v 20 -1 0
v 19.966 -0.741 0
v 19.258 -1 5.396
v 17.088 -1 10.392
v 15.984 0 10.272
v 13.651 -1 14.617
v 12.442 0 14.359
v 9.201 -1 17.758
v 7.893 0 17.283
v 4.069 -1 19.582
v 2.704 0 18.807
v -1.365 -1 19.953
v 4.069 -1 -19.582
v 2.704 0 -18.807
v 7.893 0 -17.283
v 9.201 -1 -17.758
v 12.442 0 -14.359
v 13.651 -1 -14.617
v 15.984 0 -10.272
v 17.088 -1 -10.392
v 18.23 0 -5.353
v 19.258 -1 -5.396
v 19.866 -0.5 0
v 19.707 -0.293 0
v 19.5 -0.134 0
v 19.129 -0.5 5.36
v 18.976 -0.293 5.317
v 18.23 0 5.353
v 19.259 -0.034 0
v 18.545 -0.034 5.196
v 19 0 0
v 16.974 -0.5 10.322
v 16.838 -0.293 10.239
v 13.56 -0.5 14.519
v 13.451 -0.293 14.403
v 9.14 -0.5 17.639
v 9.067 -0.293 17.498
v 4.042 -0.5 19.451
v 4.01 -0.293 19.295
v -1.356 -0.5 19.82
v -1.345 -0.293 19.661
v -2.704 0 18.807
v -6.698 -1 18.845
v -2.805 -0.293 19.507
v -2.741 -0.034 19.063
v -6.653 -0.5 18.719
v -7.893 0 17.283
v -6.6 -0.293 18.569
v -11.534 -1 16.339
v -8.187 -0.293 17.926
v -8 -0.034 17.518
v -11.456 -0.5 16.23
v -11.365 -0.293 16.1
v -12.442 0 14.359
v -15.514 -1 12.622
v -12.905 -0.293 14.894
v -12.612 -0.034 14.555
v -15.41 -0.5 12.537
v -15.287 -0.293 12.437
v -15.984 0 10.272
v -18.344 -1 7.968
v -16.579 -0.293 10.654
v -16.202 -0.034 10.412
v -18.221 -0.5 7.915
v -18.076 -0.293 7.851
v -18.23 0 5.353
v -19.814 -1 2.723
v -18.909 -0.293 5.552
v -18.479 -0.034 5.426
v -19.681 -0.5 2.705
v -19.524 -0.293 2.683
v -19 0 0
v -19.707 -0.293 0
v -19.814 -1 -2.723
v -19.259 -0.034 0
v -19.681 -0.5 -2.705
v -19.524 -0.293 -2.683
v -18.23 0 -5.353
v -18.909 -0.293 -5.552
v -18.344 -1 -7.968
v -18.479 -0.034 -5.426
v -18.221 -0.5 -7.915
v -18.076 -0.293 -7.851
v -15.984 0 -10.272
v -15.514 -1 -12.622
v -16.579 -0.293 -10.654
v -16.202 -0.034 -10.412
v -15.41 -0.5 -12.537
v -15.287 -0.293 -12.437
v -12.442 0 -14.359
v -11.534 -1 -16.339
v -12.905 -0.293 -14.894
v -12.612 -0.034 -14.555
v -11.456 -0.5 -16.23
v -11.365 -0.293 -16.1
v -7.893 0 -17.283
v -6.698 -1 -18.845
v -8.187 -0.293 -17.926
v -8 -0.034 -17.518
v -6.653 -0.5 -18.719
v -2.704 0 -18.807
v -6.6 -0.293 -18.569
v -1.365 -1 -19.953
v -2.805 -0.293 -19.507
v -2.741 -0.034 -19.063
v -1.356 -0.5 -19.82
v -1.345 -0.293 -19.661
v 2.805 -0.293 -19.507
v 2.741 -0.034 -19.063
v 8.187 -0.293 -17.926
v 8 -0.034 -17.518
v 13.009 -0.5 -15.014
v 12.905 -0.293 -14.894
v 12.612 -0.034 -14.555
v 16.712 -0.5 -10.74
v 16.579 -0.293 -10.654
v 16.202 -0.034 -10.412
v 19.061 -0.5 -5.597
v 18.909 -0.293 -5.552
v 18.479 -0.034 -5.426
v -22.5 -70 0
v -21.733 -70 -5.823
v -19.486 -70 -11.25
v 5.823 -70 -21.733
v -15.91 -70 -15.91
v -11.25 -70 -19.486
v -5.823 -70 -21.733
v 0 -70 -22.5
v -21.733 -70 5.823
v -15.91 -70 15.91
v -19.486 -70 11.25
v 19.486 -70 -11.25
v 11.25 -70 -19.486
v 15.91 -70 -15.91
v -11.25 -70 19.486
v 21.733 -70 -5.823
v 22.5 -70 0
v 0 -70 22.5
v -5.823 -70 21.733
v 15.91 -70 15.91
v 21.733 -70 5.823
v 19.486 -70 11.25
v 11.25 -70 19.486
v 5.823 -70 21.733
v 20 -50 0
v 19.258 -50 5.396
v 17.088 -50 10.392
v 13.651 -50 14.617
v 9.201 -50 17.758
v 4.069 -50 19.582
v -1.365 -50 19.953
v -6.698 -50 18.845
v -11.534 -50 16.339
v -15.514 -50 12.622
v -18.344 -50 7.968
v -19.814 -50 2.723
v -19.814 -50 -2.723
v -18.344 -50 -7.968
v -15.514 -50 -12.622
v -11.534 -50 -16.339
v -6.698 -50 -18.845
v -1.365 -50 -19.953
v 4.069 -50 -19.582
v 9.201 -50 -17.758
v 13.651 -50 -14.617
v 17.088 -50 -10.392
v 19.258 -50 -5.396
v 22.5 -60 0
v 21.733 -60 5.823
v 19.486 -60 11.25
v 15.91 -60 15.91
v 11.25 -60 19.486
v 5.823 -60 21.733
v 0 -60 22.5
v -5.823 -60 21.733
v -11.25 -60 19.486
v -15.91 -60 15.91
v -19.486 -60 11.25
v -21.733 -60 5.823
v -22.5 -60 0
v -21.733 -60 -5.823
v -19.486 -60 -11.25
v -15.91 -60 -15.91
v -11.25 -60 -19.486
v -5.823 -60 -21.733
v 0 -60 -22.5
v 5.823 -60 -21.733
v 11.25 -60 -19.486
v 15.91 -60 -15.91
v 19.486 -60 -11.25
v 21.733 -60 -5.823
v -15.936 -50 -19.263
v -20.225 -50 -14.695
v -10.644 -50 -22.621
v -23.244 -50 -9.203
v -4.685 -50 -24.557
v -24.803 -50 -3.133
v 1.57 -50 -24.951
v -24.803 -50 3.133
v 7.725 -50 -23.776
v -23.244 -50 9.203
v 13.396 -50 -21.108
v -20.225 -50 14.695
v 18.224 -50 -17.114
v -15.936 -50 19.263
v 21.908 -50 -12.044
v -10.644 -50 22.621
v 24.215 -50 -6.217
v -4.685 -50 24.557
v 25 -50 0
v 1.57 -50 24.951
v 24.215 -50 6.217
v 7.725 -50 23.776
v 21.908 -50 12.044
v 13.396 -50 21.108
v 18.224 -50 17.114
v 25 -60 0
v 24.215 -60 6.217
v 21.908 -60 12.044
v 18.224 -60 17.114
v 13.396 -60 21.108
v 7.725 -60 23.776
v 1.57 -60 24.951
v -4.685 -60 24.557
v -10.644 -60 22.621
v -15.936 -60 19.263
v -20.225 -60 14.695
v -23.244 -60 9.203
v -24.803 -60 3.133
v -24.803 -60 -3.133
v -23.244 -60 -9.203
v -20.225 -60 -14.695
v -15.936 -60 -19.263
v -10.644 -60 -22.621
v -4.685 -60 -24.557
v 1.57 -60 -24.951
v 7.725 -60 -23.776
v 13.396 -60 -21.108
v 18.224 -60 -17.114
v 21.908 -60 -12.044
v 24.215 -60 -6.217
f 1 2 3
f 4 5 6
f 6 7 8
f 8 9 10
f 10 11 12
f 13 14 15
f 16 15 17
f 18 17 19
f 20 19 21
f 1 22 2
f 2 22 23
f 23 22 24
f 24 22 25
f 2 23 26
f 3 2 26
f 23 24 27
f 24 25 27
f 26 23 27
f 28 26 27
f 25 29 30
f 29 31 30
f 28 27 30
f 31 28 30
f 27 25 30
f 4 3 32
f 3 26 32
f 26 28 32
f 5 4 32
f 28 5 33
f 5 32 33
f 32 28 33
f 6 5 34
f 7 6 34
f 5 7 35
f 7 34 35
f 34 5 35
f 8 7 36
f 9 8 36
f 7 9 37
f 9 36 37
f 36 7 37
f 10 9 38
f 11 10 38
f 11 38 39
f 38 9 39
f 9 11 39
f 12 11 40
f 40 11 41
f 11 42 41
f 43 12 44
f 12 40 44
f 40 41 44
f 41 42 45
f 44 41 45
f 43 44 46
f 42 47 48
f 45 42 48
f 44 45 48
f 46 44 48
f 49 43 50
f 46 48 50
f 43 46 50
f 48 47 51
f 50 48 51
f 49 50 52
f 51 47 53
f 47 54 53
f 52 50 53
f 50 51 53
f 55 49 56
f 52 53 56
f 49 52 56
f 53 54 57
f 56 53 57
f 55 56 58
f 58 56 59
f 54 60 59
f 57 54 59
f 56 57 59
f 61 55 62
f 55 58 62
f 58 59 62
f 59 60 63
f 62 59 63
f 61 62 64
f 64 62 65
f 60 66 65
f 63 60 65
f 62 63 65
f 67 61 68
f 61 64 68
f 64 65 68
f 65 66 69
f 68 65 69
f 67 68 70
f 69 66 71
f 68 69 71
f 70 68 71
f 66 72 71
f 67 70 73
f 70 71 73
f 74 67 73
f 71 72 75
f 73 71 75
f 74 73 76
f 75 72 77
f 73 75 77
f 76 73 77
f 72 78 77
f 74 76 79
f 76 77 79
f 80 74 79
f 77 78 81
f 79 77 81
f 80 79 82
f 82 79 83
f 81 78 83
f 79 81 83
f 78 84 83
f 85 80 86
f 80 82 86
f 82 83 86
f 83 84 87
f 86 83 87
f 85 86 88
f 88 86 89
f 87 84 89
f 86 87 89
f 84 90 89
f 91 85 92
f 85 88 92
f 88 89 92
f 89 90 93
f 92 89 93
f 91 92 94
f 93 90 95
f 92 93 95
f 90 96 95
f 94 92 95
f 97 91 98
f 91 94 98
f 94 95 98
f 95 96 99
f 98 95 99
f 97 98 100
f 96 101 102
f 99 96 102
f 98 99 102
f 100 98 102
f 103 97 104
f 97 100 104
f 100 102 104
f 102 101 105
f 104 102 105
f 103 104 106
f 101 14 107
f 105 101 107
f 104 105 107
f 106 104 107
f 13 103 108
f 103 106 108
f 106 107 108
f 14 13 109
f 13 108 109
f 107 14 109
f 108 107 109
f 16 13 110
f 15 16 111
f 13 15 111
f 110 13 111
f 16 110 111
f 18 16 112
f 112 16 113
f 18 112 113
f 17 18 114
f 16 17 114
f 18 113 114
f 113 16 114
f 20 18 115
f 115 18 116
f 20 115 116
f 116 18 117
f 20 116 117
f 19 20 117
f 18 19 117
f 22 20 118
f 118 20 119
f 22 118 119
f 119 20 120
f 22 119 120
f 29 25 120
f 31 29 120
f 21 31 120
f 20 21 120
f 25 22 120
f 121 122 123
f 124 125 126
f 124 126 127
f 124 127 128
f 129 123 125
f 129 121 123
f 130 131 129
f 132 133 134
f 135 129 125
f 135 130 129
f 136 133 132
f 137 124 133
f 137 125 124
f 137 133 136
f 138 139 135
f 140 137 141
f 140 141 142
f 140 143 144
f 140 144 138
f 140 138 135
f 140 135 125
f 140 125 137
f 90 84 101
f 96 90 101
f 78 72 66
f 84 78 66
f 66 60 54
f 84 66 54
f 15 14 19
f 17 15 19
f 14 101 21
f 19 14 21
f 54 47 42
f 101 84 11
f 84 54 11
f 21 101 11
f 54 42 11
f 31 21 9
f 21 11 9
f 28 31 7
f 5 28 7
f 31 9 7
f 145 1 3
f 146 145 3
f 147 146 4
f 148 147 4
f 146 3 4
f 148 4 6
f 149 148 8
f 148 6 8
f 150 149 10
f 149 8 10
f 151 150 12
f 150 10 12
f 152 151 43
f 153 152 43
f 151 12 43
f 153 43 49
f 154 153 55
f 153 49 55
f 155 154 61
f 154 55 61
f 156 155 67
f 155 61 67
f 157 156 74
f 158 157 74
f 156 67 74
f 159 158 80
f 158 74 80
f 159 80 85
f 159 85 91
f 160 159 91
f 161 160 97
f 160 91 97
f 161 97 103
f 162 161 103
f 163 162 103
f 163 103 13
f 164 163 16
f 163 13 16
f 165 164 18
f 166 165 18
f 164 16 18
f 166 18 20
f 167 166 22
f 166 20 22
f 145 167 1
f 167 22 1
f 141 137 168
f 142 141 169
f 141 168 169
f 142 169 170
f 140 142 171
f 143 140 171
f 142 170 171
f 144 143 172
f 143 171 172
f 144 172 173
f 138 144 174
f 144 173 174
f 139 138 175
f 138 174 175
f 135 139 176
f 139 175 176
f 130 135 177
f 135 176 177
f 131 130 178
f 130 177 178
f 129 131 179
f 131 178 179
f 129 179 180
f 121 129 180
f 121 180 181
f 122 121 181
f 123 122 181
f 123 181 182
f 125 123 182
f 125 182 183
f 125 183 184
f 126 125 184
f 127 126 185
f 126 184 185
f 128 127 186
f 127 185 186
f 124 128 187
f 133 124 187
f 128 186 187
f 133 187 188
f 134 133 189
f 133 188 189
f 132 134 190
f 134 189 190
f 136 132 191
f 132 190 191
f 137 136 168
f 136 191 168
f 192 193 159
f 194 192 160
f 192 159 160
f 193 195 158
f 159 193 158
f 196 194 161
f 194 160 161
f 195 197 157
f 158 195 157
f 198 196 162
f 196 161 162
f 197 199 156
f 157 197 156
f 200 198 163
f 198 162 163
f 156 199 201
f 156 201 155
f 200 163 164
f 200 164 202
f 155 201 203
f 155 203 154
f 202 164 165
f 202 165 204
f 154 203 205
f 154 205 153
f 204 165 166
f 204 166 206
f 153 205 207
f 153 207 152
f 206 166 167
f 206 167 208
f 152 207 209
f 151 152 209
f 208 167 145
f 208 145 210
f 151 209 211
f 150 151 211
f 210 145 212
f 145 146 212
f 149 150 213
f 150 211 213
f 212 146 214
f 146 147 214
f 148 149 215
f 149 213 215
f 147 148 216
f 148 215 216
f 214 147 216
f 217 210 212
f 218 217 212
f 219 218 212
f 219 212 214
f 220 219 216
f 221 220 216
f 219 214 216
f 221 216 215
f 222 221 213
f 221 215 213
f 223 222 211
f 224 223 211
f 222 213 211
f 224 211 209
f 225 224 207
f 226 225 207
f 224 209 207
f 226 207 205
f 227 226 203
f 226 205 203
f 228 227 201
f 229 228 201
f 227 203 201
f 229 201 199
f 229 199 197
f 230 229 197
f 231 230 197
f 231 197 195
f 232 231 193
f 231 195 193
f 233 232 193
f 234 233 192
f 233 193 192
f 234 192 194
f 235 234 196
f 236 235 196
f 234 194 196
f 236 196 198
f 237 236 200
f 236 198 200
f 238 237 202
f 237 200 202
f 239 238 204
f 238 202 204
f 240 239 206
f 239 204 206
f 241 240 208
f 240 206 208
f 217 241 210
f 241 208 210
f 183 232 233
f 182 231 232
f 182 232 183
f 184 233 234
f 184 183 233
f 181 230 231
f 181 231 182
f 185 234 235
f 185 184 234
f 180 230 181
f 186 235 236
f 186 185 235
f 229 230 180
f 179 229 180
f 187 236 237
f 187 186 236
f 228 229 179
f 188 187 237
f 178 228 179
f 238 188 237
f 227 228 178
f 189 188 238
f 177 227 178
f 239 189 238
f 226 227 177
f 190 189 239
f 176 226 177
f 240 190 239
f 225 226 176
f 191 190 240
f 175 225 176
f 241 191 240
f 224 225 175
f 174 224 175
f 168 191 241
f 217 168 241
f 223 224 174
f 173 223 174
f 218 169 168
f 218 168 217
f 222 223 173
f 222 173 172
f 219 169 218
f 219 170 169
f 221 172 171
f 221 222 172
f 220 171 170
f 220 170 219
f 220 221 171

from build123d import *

# Parameters (mm, degrees)
F0_R     = 20
F1_DEPTH = 50
F2_R     = 25
F3_DEPTH = 10
F4_R     = 22.5
F5_DEPTH = 10
F6_R     = 1


with BuildPart() as f1:
    # F0 (on Front) → F1 (new body)
    with BuildSketch(Plane.XZ):
        Circle(F0_R)
    extrude(amount=F1_DEPTH)

    # F2 (on face) → F3 (join)
    with BuildSketch(Plane.XZ.offset(50)):
        Circle(F2_R)
    extrude(amount=F3_DEPTH)

    # F4 (on face) → F5 (join)
    with BuildSketch(Plane.XZ.offset(60)):
        Circle(F4_R)
    extrude(amount=F5_DEPTH)

    # F6
    f6_edges = [f1.edges().sort_by_distance(p)[0] for p in [
        (-20, 0, 0),
    ]]
    fillet(f6_edges, radius=F6_R)


solid = f1.part
